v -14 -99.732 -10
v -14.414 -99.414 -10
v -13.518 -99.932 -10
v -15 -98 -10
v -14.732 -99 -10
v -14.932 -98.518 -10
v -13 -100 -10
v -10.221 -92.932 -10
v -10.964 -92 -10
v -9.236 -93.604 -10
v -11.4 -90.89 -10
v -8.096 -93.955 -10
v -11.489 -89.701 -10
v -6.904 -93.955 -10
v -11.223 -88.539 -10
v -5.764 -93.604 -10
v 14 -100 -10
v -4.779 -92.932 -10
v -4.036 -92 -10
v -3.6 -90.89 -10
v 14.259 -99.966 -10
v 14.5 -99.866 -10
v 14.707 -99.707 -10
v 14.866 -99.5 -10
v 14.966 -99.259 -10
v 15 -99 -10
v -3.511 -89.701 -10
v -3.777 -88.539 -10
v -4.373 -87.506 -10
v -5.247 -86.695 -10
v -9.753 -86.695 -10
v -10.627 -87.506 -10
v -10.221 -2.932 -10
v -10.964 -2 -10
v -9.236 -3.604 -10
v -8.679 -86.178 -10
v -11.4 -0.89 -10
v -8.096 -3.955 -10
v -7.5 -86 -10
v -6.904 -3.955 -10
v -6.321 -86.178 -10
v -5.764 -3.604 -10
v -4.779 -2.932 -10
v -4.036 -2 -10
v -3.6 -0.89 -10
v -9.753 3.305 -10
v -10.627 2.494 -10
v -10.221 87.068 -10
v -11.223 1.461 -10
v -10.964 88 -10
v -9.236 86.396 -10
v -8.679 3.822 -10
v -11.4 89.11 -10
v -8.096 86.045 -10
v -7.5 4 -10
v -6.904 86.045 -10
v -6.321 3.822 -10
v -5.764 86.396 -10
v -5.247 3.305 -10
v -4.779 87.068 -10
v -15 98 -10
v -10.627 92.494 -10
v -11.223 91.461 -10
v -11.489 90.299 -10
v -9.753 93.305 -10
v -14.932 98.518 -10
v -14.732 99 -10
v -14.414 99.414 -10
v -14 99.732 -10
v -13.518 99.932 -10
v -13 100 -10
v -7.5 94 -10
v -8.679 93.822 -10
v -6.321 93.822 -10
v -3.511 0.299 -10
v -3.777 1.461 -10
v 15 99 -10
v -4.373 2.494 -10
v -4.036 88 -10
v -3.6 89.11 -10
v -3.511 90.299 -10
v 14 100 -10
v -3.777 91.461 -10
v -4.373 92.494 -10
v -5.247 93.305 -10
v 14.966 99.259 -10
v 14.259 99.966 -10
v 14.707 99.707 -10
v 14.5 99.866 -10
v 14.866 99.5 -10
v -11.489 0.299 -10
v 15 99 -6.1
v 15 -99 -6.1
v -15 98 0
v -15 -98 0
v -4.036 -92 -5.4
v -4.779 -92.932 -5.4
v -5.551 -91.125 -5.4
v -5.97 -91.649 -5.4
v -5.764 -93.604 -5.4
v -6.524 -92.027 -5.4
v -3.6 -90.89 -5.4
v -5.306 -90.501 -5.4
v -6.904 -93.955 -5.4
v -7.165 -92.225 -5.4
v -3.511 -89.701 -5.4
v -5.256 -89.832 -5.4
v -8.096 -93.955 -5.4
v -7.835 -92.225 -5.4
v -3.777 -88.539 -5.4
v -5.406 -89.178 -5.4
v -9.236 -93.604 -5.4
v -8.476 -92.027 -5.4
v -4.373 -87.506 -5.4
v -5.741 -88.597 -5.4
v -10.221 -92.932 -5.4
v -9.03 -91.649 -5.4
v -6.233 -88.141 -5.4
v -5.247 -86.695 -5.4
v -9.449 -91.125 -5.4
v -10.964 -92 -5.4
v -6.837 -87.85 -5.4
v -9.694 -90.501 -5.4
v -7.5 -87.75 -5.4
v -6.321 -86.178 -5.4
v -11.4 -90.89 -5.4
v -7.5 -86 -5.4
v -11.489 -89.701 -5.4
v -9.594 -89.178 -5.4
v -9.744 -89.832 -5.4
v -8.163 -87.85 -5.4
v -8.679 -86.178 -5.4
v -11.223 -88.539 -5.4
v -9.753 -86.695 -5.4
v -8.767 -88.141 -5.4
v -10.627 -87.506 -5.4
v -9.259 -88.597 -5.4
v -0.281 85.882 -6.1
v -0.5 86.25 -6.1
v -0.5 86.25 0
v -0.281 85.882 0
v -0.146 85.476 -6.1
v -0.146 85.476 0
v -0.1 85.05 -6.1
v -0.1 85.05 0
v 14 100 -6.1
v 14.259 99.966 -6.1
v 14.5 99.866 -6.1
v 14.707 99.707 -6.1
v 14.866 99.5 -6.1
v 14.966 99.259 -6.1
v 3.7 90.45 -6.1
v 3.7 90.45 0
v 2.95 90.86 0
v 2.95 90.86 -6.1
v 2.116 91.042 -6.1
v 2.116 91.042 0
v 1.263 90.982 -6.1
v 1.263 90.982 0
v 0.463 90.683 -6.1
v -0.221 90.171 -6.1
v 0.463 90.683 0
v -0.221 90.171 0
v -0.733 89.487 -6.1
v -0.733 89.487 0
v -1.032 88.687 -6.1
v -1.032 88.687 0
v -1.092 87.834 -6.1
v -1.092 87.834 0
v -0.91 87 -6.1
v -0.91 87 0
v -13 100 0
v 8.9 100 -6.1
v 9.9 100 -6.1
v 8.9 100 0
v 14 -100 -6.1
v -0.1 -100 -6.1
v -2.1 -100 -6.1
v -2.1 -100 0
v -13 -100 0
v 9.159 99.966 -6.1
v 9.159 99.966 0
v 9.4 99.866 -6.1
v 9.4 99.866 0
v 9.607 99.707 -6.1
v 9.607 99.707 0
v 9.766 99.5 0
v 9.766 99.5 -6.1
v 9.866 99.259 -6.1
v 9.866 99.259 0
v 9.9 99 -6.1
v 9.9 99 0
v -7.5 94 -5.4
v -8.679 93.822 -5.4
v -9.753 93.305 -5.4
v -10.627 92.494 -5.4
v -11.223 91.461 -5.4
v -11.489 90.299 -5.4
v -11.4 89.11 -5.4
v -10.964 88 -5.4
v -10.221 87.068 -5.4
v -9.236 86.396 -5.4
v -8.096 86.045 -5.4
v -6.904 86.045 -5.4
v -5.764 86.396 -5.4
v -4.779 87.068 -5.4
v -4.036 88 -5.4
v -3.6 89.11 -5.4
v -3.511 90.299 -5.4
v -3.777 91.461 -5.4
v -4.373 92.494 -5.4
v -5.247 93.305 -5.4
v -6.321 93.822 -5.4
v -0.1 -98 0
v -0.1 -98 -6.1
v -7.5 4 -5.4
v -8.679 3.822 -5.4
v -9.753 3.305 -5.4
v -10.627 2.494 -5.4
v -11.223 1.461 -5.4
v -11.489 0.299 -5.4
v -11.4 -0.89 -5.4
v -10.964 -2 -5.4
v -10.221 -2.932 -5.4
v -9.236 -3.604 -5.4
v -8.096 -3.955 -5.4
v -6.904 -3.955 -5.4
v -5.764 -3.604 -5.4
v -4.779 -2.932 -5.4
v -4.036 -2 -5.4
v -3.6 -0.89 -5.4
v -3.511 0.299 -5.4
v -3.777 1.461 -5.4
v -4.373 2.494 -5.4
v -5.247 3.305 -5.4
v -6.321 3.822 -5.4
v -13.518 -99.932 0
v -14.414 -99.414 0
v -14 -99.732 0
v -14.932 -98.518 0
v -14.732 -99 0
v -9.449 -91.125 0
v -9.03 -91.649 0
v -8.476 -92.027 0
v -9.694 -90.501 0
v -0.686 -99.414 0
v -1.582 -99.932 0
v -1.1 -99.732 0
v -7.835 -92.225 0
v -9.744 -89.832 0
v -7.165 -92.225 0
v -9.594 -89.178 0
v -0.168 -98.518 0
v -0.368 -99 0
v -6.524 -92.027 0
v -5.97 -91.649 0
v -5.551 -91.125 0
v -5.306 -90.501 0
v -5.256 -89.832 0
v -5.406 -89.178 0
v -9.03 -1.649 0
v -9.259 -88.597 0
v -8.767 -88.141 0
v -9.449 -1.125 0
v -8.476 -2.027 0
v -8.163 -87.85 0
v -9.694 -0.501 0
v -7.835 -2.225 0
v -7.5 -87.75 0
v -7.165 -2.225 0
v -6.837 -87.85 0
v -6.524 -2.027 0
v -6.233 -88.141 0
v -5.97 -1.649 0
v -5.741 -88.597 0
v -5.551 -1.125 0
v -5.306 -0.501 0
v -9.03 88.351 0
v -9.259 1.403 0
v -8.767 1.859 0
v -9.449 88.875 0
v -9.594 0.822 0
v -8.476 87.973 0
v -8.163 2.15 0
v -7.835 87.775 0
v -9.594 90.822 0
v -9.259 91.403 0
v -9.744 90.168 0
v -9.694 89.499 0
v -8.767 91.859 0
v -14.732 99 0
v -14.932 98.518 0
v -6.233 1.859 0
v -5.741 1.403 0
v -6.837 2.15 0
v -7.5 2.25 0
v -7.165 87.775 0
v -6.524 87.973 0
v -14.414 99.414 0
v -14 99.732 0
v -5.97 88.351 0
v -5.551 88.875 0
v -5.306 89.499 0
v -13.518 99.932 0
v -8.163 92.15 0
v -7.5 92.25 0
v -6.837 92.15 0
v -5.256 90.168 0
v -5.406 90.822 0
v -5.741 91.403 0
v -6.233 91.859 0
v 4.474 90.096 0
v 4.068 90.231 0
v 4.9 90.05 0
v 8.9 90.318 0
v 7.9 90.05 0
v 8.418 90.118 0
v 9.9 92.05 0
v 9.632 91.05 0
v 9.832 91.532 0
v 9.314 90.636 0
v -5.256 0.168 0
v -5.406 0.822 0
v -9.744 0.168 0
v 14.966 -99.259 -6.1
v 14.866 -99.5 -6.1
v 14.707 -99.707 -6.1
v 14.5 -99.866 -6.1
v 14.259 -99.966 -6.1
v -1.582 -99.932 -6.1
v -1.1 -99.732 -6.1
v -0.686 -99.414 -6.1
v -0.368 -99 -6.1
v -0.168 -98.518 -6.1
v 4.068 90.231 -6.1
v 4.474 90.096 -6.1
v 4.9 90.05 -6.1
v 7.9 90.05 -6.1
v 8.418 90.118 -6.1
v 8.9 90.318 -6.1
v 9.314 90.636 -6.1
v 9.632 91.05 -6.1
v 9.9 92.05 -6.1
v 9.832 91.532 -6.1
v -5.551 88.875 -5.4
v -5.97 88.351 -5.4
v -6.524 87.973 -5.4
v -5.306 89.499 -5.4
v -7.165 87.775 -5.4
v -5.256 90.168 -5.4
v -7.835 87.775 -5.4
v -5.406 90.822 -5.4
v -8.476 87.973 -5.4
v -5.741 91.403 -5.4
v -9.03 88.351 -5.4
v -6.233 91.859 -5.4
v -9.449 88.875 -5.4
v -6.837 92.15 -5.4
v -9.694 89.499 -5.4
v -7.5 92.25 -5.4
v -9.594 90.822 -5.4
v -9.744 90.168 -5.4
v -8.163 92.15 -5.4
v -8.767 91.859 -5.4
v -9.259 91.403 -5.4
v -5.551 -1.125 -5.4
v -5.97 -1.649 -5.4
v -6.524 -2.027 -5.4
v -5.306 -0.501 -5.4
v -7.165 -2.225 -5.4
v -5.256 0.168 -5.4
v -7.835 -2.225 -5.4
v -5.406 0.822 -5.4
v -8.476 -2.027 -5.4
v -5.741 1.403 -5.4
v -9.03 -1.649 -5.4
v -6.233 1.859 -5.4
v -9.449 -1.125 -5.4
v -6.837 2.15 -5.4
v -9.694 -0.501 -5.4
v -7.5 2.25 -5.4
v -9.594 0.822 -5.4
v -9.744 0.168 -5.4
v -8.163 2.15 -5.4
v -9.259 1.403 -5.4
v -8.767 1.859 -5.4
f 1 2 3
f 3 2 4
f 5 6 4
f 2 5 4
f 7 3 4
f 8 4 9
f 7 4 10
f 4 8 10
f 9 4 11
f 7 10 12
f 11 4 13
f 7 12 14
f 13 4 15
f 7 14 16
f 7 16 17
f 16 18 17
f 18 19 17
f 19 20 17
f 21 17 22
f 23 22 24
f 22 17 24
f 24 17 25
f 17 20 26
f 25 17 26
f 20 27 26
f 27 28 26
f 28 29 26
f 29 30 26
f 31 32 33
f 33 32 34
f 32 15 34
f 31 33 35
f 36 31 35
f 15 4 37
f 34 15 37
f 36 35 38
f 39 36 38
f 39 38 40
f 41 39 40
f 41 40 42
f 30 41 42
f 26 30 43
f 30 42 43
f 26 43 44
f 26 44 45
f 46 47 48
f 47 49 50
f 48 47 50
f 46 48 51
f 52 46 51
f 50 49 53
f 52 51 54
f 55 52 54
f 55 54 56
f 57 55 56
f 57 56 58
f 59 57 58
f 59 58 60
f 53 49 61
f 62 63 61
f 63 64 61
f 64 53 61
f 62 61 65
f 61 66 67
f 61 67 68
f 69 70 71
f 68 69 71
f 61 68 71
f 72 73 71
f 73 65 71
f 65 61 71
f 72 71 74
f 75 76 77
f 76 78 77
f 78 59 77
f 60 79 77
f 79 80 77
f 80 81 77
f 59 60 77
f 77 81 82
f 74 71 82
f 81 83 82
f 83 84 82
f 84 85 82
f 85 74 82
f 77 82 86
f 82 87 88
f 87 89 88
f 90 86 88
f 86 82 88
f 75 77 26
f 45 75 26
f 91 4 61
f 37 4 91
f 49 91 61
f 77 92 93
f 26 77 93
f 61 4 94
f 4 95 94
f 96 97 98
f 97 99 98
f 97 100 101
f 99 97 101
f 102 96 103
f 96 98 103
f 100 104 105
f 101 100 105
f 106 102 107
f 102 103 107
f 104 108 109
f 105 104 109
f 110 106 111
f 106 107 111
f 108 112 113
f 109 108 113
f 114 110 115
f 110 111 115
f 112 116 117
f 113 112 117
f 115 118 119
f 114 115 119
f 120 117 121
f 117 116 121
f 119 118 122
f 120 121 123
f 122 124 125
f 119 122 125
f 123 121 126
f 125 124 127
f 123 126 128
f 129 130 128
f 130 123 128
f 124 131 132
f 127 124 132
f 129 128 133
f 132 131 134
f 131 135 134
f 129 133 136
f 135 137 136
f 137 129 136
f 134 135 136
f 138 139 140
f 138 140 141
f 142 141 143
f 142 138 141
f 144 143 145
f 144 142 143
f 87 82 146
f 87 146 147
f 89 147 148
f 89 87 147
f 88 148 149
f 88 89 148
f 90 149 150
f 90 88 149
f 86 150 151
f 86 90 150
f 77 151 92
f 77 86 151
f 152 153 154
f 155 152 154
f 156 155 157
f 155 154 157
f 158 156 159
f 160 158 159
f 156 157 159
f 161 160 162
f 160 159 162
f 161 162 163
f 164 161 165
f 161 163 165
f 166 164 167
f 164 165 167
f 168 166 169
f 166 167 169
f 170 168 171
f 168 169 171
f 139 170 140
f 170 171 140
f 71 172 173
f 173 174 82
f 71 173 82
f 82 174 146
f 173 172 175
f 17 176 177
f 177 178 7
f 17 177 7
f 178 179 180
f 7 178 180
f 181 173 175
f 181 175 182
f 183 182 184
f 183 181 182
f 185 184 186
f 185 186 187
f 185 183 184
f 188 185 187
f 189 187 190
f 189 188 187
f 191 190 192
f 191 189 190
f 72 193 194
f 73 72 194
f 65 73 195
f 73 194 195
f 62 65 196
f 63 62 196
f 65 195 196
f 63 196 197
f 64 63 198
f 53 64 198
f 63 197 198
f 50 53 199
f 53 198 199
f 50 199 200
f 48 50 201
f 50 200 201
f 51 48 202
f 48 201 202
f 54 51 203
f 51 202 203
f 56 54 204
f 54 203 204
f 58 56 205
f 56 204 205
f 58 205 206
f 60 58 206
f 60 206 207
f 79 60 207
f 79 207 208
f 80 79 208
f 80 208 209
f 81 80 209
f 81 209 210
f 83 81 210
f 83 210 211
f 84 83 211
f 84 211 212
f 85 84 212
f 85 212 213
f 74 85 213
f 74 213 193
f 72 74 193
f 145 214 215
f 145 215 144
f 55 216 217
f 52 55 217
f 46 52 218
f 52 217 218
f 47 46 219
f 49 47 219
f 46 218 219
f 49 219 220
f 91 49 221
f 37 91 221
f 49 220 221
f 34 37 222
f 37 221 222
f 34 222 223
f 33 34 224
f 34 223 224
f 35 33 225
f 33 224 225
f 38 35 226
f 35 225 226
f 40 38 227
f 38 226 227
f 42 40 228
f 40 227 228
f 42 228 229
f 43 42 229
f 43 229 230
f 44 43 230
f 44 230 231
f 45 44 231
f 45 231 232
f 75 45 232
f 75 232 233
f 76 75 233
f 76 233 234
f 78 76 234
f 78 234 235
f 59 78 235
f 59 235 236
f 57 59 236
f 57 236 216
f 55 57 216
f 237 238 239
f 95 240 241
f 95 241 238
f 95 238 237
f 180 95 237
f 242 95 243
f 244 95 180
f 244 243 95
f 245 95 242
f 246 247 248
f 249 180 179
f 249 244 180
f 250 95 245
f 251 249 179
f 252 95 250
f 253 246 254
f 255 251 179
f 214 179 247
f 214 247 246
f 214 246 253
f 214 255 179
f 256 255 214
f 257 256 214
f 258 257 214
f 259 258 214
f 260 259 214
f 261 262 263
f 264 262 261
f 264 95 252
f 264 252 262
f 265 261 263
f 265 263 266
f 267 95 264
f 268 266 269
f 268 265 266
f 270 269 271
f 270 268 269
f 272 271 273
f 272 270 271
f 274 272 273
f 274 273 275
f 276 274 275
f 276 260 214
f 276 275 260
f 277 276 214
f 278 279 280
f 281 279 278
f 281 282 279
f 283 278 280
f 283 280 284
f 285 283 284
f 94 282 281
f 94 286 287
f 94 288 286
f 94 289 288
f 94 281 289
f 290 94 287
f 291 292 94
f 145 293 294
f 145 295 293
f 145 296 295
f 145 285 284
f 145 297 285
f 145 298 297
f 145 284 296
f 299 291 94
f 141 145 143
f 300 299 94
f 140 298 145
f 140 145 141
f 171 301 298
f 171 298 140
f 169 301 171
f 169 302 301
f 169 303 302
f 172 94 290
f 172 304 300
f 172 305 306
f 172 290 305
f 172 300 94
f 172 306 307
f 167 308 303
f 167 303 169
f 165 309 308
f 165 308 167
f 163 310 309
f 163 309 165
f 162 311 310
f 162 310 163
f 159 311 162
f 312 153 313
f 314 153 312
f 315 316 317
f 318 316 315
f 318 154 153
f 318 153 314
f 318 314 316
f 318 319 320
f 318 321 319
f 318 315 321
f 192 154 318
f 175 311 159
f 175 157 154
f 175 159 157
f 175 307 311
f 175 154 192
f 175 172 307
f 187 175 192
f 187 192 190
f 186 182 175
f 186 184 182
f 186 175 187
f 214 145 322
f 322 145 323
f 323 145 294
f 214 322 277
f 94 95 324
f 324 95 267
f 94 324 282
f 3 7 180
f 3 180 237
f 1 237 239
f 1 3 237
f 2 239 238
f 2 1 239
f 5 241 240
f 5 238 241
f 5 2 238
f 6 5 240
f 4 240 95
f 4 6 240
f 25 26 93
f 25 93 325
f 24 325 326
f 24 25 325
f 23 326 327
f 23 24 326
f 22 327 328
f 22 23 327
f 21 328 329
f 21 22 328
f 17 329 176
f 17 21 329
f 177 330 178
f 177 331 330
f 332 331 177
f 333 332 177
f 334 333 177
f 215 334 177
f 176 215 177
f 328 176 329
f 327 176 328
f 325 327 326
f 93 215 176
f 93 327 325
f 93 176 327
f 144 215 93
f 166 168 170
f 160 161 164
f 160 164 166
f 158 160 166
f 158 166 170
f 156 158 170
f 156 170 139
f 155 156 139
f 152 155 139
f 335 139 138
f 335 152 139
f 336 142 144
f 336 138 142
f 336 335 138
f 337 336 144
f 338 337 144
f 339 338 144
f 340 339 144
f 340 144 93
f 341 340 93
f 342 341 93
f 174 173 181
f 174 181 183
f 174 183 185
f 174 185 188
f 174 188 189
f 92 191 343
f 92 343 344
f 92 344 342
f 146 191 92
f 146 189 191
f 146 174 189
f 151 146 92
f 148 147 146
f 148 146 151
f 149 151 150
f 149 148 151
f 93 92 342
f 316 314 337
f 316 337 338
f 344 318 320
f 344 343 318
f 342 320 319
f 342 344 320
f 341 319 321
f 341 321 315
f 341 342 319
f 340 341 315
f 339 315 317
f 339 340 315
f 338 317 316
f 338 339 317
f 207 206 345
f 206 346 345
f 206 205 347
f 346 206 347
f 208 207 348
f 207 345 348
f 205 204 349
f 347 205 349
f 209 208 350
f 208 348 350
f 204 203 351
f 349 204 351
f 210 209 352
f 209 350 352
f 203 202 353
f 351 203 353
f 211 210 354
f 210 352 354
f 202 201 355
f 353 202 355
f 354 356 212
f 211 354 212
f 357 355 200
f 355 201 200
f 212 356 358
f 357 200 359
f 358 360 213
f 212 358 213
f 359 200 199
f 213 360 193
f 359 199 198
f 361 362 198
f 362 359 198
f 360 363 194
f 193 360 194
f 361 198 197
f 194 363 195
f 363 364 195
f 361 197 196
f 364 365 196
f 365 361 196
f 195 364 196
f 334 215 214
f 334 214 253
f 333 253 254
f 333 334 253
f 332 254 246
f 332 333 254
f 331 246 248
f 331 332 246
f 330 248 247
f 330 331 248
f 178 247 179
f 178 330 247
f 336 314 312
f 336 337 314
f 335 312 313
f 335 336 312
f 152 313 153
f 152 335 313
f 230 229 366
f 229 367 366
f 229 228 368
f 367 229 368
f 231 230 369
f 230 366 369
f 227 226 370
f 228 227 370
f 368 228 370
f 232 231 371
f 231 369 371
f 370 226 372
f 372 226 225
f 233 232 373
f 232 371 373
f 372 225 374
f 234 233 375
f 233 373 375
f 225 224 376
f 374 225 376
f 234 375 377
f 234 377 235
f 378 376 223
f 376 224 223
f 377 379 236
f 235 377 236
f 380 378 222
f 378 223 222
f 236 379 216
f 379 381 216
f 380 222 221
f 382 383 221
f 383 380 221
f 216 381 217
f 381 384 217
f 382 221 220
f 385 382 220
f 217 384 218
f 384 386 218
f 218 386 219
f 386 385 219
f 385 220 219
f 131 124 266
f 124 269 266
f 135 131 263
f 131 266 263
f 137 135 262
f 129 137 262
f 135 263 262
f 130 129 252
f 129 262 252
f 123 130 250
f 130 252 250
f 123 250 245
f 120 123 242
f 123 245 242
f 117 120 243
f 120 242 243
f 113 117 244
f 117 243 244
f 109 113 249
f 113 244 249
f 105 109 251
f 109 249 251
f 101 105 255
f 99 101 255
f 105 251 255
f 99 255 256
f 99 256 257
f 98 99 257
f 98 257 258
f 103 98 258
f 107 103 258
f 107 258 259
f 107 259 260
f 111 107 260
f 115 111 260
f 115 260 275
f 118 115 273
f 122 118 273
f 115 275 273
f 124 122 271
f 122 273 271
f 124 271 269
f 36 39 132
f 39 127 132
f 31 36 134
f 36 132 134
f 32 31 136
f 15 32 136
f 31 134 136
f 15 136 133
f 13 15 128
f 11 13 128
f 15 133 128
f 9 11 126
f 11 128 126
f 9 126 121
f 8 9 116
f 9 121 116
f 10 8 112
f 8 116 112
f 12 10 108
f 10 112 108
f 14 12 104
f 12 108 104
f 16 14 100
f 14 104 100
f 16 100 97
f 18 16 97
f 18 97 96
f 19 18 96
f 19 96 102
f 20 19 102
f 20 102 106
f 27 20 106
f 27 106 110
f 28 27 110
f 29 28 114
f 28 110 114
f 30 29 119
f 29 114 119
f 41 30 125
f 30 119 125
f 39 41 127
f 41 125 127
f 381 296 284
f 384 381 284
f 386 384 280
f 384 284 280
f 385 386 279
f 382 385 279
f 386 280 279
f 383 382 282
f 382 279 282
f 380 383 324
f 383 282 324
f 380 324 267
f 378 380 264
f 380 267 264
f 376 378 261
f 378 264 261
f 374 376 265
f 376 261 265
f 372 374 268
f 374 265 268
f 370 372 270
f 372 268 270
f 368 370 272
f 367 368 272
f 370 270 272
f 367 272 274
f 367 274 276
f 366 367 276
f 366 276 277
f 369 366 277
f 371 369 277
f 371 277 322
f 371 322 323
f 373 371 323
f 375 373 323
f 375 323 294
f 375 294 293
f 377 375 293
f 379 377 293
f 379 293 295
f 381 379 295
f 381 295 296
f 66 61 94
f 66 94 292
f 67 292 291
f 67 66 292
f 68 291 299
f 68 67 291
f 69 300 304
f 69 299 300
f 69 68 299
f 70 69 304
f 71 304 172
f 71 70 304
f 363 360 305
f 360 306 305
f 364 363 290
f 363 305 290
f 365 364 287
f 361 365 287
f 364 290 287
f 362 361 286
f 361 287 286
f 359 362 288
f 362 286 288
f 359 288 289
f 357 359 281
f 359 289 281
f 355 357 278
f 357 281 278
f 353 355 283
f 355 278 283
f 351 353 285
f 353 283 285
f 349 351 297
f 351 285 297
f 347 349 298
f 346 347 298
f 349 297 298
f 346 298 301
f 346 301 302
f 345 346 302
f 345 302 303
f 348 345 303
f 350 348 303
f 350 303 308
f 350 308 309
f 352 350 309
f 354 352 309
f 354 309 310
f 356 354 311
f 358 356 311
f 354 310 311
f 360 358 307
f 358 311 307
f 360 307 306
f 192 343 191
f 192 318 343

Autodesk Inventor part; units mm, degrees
ref_plane "YZ Plane" through (0, 0, 0) normal (1, 0, 0) x (0, 1, 0)
ref_plane "XZ Plane" through (0, 0, 0) normal (0, 1, 0) x (-1, 0, 0)
ref_plane "XY Plane" through (0, 0, 0) normal (0, 0, 1) x (1, 0, 0)
sketch "Sketch1" plane through (0, 0, 0) normal (0, 0, 1) x (1, 0, 0)
  line L0 (-21, 0) -> (21, 0) construction
  line L1 (0, -140) -> (0, 140) construction
  line L2 (-15, 100) -> (15, 100)
  line L3 (15, 100) -> (15, -100)
  line L4 (15, -100) -> (-15, -100)
  line L5 (-15, -100) -> (-15, 100)
  line L6 (-0.1, 90.05) -> (15, 90.05)
  line L7 (15, 90.05) -> (15, -100)
  line L8 (15, -100) -> (-0.1, -100)
  line L9 (-0.1, -100) -> (-0.1, 90.05)
  circle A0 centre (1.9, 88.05) radius 3
  line L10 (9.9, 100) -> (15, 100)
  line L11 (15, 100) -> (15, 90.05)
  line L12 (15, 90.05) -> (9.9, 90.05)
  line L13 (9.9, 90.05) -> (9.9, 100)
  point P0 (0, 0)
  point P1 (15, 90.05)
  point P2 (4.1361, 90.05)
  point P3 (-0.1, 85.8139)
  dimension "d0" = 30
  dimension "d1" = 200
  dimension "d2" = 9.95
  dimension "d3" = 15.1
  dimension "d16" = 2
  dimension "d17" = 6
  dimension "d18" = 2
  dimension "d23" = 14.9
  dimension "d27" = 10
extrude "Extrusion1" add sketch "Sketch1" against normal blind 10
extrude "Extrusion2" cut sketch "Sketch1" against normal blind 6.1 contours L2 L3 L6 L13 | L6 L3 L4 L9 A0 | A0 L9 L6 | L6 L9 A0
sketch "Sketch2" plane through (0, 0, -10) normal (0, 0, -1) x (-1, 0, 0)
  line L0 (-4.1361, 90.05) -> (-9.9, 90.05) construction
  line L1 (-9.9, 100) -> (15, 100) construction
  line L2 (15, 100) -> (15, -100) construction
  line L3 (15, -100) -> (0.1, -100) construction
  line L4 (0.1, -100) -> (0.1, 85.8139) construction
  line L5 (7.5, -100) -> (7.5, 100) construction
  line L6 (21, 0) -> (-21, 0) construction
  arc A0 (0.1, 85.8139) -> (-4.1361, 90.05) centre (-1.9, 88.05) ccw projected
  line L7 (-9.9, 90.05) -> (-9.9, 100) projected
  point P0 (0, 0)
  point P1 (7.5, -90)
  point P2 (7.5, 90)
  point P3 (7.5, 0)
  dimension "d8" = 180
  dimension "d25" = 7.5
hole "Hole1" at (-7.5, -90, -10) at (-7.5, 0, -10) at (-7.5, 90, -10) direction (0, 0, 1) diameter 4.5 end through all counterbore diameter 8 counterbore depth 4.6 clearance for "Socket Head Cap Screw ISO 4762" size "M4" standard "ISO"
fillet "Fillet1" radius 2 6 edges at (-15, -100, -5) (-15, 100, -5) (-0.1, -100, -3.05) (-0.1, 85.8139, -3.05) (4.1361, 90.05, -3.05) (9.9, 90.05, -3.05)
fillet "Fillet1" radius 1 3 edges at (15, -100, -8.05) (15, 100, -8.05) (9.9, 100, -3.05)
equation "\"d16\" = 0.333333 * d17"
equation "\"d18\" = d16"
properties part number "DLT-01-233" material "Acrílico TP"
